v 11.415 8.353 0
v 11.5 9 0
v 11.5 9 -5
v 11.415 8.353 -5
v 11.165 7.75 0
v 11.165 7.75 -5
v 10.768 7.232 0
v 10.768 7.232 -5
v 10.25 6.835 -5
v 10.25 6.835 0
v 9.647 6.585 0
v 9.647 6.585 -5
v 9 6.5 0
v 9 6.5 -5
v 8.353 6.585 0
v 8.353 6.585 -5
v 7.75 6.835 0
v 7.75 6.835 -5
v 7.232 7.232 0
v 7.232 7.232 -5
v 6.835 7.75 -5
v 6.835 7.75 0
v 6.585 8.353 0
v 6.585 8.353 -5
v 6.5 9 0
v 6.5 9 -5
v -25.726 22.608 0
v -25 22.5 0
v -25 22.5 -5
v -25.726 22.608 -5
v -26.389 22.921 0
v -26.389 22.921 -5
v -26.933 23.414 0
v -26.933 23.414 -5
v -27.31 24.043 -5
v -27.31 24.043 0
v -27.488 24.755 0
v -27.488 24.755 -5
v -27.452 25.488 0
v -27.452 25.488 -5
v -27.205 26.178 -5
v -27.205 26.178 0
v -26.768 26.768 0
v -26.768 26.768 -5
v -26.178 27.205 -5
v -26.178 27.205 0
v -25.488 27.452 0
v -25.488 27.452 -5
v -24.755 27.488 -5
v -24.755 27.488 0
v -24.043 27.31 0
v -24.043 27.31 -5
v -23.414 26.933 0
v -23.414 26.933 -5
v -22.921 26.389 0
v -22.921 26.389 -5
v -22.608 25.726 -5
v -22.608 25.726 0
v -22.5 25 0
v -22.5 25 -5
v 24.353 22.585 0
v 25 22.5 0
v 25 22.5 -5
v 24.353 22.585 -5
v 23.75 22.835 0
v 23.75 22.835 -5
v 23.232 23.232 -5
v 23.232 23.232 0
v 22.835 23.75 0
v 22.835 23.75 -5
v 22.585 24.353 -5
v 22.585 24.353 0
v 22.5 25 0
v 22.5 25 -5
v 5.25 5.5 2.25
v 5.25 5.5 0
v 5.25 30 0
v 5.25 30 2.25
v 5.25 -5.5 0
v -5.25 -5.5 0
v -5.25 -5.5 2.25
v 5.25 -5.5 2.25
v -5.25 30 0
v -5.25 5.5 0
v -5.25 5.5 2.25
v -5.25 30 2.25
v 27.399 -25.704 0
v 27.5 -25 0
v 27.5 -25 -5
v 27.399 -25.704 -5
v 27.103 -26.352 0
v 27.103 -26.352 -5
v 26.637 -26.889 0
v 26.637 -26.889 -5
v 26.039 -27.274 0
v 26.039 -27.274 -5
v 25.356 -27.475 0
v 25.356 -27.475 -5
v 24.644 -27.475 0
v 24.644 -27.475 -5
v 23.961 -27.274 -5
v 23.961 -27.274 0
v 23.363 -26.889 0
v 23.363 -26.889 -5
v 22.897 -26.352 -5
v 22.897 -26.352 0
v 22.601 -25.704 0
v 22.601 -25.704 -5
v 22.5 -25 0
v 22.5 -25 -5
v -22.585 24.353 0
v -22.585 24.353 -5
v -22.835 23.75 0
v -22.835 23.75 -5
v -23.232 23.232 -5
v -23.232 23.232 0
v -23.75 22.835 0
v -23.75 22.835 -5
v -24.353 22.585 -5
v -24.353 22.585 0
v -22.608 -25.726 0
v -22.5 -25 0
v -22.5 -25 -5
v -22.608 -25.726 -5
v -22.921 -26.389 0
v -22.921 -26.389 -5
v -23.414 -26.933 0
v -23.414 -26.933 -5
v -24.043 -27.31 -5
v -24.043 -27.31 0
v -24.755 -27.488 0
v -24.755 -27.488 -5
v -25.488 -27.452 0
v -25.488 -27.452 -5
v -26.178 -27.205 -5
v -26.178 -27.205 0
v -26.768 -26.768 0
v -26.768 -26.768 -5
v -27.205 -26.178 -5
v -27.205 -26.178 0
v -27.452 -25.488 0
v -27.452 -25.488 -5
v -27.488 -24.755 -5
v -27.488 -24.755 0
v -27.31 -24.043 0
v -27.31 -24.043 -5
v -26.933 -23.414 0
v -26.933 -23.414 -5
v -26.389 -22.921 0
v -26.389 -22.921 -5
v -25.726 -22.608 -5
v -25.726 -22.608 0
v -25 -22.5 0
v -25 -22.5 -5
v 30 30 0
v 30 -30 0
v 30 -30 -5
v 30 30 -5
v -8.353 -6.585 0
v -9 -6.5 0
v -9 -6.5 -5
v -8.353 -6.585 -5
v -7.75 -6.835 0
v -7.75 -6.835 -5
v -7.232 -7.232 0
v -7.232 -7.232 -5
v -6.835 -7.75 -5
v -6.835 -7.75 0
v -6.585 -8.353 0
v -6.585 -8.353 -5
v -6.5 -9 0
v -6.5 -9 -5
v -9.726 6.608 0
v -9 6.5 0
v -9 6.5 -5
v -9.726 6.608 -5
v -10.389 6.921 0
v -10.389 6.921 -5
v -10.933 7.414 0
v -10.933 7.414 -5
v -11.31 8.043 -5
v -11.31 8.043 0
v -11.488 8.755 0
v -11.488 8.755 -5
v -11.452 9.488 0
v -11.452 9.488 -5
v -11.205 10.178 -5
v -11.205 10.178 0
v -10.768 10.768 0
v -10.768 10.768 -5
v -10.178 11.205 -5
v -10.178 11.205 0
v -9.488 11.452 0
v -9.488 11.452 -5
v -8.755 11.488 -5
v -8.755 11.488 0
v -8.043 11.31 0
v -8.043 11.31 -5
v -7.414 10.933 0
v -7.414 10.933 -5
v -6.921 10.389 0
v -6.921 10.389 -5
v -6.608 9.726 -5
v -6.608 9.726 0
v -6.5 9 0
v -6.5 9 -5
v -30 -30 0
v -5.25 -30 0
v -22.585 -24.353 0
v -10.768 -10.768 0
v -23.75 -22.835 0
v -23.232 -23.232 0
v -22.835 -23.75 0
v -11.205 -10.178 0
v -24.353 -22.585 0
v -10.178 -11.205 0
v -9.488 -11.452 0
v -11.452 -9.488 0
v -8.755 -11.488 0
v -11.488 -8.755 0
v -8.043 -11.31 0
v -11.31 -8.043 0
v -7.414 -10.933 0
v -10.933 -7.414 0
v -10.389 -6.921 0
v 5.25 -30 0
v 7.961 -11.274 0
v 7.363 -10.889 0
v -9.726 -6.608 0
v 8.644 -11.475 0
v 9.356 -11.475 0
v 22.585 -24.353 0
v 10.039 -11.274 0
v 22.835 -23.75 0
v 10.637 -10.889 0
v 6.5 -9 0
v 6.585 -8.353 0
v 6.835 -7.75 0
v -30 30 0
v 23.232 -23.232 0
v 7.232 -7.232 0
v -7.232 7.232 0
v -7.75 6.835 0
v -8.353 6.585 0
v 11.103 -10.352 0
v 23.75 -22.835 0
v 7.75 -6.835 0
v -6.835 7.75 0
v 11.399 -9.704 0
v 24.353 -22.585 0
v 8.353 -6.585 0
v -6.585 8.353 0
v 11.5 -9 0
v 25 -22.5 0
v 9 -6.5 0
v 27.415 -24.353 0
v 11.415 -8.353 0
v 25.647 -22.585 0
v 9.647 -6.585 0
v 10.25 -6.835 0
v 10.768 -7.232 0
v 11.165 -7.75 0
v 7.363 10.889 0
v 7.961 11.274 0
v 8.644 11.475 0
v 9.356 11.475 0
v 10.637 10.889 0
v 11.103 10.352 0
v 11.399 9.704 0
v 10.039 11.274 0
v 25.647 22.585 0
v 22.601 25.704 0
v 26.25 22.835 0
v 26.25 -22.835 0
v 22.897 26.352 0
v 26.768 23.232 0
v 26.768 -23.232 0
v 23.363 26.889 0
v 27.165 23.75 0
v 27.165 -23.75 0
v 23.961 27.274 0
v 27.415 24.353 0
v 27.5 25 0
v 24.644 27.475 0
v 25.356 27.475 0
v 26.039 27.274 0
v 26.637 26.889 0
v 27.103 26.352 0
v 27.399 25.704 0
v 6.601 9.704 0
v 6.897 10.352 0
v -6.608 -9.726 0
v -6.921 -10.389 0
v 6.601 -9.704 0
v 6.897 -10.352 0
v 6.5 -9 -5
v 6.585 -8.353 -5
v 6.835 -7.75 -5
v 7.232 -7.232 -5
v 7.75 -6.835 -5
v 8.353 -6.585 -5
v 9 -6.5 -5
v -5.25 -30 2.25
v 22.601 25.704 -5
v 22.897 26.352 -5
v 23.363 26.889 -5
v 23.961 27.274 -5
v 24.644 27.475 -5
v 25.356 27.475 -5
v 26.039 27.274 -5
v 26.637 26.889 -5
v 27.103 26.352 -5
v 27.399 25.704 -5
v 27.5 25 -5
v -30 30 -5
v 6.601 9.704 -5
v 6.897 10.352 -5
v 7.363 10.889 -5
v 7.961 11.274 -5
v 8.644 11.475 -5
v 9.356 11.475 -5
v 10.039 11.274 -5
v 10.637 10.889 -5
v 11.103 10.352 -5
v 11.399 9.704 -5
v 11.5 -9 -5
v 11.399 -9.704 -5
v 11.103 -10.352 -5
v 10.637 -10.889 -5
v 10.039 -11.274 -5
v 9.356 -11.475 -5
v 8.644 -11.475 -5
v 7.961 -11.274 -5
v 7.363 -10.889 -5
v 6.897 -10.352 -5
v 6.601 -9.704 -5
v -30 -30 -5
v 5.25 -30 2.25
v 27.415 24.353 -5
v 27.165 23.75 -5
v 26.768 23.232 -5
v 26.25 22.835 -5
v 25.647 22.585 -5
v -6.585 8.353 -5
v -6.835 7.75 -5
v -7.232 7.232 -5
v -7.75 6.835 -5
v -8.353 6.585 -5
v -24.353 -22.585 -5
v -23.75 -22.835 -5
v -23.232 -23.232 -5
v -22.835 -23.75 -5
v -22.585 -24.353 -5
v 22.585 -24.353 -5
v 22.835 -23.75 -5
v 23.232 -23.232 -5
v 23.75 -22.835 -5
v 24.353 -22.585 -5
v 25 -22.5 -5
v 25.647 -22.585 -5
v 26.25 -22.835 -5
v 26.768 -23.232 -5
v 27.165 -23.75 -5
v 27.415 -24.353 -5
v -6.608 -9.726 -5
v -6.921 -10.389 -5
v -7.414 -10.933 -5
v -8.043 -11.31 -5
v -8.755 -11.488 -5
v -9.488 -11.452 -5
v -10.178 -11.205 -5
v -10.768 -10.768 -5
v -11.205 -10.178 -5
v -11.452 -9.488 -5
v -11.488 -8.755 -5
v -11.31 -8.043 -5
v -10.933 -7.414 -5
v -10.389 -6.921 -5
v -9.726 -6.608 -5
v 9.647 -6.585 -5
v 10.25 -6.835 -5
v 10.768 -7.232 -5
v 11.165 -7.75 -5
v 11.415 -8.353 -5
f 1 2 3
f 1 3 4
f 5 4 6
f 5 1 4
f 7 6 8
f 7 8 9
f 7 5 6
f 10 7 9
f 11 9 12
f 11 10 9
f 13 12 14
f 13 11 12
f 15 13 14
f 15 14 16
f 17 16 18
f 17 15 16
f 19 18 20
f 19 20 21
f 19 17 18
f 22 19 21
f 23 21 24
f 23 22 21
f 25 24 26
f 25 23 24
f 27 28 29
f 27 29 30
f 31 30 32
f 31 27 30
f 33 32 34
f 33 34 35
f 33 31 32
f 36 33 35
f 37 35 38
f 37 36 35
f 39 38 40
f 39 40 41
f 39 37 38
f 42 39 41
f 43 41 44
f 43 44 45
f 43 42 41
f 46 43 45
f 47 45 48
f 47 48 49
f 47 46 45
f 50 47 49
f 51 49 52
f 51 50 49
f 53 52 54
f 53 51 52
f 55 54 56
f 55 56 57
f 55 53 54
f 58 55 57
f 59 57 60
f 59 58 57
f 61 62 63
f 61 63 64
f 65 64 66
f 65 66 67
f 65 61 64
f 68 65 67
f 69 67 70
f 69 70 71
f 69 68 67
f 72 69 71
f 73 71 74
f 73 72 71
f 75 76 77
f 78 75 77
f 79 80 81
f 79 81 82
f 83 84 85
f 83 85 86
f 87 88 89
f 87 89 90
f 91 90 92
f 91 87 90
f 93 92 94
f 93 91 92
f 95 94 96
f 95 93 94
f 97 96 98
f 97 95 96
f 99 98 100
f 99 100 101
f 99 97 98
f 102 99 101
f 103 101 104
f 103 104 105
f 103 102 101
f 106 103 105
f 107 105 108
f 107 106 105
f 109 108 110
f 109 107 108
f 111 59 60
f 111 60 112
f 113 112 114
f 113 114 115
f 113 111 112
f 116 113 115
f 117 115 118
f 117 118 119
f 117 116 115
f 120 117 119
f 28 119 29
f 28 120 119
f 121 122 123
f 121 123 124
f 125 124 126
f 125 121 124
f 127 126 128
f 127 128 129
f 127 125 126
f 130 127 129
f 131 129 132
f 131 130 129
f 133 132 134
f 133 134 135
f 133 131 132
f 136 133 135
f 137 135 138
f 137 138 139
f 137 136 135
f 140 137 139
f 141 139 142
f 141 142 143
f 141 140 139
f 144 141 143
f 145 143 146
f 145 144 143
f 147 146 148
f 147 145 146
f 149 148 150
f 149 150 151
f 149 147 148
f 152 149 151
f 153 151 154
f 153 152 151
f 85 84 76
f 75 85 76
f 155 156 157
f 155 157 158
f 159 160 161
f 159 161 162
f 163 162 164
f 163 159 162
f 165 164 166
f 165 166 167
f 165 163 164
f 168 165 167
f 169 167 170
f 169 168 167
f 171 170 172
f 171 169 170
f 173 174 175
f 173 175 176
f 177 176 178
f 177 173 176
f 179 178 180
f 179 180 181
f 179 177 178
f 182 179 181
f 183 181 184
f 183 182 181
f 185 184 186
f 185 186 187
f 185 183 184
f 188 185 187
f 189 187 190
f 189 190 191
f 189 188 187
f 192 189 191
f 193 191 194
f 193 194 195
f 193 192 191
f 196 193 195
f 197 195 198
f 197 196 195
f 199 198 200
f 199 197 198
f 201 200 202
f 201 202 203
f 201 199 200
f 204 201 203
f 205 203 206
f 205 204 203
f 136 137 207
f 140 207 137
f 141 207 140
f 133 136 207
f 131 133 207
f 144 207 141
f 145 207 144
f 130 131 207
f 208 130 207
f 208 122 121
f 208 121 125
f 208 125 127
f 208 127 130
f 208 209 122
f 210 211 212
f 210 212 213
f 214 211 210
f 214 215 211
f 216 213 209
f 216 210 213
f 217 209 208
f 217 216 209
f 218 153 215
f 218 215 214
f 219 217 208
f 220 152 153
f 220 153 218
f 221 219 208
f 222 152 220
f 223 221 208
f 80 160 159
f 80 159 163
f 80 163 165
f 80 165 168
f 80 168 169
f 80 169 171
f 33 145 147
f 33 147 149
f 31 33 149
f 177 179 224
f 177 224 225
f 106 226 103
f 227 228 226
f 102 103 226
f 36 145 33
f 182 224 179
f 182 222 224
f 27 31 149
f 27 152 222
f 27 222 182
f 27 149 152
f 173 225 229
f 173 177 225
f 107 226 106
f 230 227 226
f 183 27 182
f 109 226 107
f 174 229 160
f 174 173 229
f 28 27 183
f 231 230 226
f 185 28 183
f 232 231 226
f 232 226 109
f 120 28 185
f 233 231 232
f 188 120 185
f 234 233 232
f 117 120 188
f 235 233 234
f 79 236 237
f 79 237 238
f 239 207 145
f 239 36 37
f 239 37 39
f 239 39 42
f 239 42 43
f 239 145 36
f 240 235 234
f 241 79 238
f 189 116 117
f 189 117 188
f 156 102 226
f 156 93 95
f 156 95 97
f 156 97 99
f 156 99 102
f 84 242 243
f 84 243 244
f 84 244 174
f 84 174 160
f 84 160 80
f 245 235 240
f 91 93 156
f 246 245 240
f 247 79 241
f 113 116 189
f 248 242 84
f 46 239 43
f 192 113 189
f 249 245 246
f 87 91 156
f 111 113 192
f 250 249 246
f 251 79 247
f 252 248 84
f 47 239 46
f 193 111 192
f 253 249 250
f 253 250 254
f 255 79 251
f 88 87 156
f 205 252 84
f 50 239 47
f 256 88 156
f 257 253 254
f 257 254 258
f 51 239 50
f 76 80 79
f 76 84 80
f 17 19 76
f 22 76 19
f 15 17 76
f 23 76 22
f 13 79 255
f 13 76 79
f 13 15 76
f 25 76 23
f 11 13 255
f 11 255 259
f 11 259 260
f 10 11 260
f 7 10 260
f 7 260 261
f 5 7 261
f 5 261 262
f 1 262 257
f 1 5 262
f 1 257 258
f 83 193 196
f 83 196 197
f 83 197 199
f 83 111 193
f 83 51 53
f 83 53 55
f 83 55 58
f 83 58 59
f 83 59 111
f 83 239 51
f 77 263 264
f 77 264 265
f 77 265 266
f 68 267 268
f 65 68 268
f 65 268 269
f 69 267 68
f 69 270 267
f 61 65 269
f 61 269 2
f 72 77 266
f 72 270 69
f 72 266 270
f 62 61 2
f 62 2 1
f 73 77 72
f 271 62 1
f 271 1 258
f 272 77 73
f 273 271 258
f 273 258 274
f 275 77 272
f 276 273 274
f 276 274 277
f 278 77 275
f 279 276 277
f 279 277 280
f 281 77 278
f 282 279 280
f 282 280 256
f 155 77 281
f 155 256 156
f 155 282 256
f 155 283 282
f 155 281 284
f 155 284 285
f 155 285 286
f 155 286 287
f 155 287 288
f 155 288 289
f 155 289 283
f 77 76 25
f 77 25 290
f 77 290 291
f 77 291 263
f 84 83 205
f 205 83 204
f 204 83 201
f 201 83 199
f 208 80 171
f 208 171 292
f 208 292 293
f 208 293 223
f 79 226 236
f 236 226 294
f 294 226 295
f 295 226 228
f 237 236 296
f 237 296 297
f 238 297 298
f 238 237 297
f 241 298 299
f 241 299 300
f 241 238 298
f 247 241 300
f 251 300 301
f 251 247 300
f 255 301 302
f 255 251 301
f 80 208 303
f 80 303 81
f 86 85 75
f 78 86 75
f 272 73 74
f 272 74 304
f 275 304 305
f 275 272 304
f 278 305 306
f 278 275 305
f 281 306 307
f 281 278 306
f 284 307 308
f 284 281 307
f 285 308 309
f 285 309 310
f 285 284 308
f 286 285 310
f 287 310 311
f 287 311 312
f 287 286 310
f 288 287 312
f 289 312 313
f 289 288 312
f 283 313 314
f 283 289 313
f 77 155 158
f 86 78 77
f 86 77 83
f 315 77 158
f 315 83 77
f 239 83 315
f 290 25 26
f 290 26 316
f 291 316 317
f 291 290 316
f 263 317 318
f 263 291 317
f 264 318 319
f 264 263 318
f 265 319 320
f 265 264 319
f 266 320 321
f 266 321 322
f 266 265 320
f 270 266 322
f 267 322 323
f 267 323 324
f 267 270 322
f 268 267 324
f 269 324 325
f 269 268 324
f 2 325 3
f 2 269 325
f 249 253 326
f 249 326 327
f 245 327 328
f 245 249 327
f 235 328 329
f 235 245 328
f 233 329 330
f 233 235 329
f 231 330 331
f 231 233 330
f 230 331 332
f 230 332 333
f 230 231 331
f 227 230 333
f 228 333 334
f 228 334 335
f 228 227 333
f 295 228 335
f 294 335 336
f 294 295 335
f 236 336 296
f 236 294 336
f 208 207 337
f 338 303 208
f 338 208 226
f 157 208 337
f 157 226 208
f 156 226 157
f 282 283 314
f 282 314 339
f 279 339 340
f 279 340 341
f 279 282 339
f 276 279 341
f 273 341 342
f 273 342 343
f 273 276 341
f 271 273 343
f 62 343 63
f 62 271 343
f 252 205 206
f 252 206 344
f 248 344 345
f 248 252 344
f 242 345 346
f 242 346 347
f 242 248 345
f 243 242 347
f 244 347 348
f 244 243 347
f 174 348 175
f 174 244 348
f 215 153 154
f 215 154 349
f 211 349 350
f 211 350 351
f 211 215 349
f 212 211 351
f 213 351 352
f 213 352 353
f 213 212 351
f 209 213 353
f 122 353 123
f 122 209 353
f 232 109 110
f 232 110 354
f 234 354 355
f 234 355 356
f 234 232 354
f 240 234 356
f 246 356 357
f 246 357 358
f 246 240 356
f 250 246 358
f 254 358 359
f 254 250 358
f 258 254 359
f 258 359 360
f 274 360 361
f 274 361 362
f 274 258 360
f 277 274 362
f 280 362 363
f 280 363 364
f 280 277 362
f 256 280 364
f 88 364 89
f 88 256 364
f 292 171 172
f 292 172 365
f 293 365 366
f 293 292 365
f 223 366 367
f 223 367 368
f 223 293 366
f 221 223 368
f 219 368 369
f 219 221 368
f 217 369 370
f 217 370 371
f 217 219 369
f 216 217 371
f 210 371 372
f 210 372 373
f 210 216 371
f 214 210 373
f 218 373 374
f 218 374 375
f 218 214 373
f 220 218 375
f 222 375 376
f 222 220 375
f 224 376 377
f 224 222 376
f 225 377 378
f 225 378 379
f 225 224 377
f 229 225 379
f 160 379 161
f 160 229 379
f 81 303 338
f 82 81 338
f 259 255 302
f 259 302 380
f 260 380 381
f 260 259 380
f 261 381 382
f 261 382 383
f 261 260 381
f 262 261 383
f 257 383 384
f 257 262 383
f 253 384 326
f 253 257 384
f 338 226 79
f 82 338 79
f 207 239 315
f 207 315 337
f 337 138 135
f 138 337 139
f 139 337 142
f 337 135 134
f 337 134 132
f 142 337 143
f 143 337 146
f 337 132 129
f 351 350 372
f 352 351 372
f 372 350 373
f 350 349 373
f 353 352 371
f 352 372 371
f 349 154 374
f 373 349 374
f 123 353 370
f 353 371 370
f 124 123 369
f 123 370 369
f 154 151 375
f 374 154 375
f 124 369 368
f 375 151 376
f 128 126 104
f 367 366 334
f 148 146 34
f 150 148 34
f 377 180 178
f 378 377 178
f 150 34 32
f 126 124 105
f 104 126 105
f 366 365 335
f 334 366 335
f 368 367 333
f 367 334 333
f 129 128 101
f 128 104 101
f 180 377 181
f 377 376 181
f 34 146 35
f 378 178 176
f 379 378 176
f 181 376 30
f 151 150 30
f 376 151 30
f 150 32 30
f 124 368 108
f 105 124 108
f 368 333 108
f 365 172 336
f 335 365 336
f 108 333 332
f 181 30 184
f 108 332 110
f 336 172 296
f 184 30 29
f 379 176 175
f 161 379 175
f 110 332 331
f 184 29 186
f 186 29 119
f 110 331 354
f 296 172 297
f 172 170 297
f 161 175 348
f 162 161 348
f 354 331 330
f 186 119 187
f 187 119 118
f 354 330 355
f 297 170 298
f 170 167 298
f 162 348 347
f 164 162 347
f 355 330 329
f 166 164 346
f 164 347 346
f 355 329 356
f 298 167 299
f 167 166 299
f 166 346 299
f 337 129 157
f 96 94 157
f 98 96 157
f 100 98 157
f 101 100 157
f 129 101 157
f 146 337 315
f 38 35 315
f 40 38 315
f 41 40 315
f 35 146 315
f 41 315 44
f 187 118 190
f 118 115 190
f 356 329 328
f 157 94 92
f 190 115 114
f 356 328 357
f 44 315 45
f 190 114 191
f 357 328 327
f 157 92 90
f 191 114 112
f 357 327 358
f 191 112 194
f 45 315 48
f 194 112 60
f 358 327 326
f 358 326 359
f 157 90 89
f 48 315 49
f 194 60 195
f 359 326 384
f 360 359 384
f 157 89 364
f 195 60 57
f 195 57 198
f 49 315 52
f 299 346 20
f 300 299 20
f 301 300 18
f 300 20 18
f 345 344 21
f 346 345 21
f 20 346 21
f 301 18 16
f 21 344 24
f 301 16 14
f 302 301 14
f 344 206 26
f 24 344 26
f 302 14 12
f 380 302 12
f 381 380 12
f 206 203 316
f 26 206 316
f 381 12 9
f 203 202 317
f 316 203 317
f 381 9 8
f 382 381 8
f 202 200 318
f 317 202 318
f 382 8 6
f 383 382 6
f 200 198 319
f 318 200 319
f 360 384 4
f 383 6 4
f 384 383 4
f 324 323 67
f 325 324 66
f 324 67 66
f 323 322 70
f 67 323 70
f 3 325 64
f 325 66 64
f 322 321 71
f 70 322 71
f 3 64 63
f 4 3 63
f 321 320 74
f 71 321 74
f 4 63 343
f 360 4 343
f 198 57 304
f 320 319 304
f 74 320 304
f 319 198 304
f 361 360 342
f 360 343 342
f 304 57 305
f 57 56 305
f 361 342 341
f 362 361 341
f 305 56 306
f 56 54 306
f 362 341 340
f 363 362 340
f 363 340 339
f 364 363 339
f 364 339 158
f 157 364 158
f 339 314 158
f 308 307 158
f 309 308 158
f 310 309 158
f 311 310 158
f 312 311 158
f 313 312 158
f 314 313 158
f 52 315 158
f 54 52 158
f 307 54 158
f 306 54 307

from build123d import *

# Parameters (mm, degrees)
F1_DEPTH = 5
F2_W     = 10.5
F2_H     = 24.5
F3_DEPTH = 2.25


# Not quite as in the source:
# - a feature names something its author has since deleted; it is built from what else it names


with BuildPart() as f1:
    # F0 (on Top) → F1 (new body)
    with BuildSketch(Plane.XY):
        Polygon((5.25, -30), (30, -30), (30, 30), (-30, 30), (-30, -30), (0, -30), align=None)
        with BuildLine():
            Line((22.5, -25), (-22.5, -25))
            ThreePointArc((-22.5, -25), (-26.767766953, -26.767766953), (-25, -22.5))
            Line((-25, -22.5), (-25, 22.5))
            ThreePointArc((-25, 22.5), (-26.767766953, 26.767766953), (-22.5, 25))
            Line((-22.5, 25), (22.5, 25))
            ThreePointArc((22.5, 25), (25, 27.5), (27.5, 25))
            ThreePointArc((27.5, 25), (26.767766953, 23.232233047), (25, 22.5))
            Line((25, 22.5), (25, -22.5))
            ThreePointArc((25, -22.5), (26.767766953, -23.232233047), (27.5, -25))
            ThreePointArc((27.5, -25), (25, -27.5), (22.5, -25))
        make_face(mode=Mode.SUBTRACT)
        with BuildLine():
            ThreePointArc((-25, -22.5), (-23.232233047, -23.232233047), (-22.5, -25))
            Line((-22.5, -25), (22.5, -25))
            ThreePointArc((22.5, -25), (23.232233047, -23.232233047), (25, -22.5))
            Line((25, -22.5), (25, 22.5))
            ThreePointArc((25, 22.5), (23.232233047, 23.232233047), (22.5, 25))
            Line((22.5, 25), (-22.5, 25))
            ThreePointArc((-22.5, 25), (-23.232233047, 23.232233047), (-25, 22.5))
            Line((-25, 22.5), (-25, -22.5))
        make_face()
        with BuildLine():
            Line((6.5, -9), (-6.5, -9))
            ThreePointArc((-6.5, -9), (-10.767766953, -10.767766953), (-9, -6.5))
            Line((-9, -6.5), (-9, 6.5))
            ThreePointArc((-9, 6.5), (-10.767766953, 10.767766953), (-6.5, 9))
            Line((-6.5, 9), (6.5, 9))
            ThreePointArc((6.5, 9), (9, 11.5), (11.5, 9))
            ThreePointArc((11.5, 9), (10.767766953, 7.232233047), (9, 6.5))
            Line((9, 6.5), (9, -6.5))
            ThreePointArc((9, -6.5), (10.767766953, -7.232233047), (11.5, -9))
            ThreePointArc((11.5, -9), (9, -11.5), (6.5, -9))
        make_face(mode=Mode.SUBTRACT)
        with BuildLine():
            ThreePointArc((-9, -6.5), (-7.232233047, -7.232233047), (-6.5, -9))
            Line((-6.5, -9), (6.5, -9))
            ThreePointArc((6.5, -9), (7.232233047, -7.232233047), (9, -6.5))
            Line((9, -6.5), (9, 6.5))
            ThreePointArc((9, 6.5), (7.232233047, 7.232233047), (6.5, 9))
            Line((6.5, 9), (-6.5, 9))
            ThreePointArc((-6.5, 9), (-7.232233047, 7.232233047), (-9, 6.5))
            Line((-9, 6.5), (-9, -6.5))
        make_face()
    extrude(amount=-F1_DEPTH)

    # F2 (on face) → F3 (join)
    with BuildSketch(Plane.XY):
        with Locations((0, 17.75)):
            Rectangle(F2_W, F2_H)
        with Locations((0, -17.75)):
            Rectangle(F2_W, F2_H)
    extrude(amount=F3_DEPTH)


solid = f1.part
